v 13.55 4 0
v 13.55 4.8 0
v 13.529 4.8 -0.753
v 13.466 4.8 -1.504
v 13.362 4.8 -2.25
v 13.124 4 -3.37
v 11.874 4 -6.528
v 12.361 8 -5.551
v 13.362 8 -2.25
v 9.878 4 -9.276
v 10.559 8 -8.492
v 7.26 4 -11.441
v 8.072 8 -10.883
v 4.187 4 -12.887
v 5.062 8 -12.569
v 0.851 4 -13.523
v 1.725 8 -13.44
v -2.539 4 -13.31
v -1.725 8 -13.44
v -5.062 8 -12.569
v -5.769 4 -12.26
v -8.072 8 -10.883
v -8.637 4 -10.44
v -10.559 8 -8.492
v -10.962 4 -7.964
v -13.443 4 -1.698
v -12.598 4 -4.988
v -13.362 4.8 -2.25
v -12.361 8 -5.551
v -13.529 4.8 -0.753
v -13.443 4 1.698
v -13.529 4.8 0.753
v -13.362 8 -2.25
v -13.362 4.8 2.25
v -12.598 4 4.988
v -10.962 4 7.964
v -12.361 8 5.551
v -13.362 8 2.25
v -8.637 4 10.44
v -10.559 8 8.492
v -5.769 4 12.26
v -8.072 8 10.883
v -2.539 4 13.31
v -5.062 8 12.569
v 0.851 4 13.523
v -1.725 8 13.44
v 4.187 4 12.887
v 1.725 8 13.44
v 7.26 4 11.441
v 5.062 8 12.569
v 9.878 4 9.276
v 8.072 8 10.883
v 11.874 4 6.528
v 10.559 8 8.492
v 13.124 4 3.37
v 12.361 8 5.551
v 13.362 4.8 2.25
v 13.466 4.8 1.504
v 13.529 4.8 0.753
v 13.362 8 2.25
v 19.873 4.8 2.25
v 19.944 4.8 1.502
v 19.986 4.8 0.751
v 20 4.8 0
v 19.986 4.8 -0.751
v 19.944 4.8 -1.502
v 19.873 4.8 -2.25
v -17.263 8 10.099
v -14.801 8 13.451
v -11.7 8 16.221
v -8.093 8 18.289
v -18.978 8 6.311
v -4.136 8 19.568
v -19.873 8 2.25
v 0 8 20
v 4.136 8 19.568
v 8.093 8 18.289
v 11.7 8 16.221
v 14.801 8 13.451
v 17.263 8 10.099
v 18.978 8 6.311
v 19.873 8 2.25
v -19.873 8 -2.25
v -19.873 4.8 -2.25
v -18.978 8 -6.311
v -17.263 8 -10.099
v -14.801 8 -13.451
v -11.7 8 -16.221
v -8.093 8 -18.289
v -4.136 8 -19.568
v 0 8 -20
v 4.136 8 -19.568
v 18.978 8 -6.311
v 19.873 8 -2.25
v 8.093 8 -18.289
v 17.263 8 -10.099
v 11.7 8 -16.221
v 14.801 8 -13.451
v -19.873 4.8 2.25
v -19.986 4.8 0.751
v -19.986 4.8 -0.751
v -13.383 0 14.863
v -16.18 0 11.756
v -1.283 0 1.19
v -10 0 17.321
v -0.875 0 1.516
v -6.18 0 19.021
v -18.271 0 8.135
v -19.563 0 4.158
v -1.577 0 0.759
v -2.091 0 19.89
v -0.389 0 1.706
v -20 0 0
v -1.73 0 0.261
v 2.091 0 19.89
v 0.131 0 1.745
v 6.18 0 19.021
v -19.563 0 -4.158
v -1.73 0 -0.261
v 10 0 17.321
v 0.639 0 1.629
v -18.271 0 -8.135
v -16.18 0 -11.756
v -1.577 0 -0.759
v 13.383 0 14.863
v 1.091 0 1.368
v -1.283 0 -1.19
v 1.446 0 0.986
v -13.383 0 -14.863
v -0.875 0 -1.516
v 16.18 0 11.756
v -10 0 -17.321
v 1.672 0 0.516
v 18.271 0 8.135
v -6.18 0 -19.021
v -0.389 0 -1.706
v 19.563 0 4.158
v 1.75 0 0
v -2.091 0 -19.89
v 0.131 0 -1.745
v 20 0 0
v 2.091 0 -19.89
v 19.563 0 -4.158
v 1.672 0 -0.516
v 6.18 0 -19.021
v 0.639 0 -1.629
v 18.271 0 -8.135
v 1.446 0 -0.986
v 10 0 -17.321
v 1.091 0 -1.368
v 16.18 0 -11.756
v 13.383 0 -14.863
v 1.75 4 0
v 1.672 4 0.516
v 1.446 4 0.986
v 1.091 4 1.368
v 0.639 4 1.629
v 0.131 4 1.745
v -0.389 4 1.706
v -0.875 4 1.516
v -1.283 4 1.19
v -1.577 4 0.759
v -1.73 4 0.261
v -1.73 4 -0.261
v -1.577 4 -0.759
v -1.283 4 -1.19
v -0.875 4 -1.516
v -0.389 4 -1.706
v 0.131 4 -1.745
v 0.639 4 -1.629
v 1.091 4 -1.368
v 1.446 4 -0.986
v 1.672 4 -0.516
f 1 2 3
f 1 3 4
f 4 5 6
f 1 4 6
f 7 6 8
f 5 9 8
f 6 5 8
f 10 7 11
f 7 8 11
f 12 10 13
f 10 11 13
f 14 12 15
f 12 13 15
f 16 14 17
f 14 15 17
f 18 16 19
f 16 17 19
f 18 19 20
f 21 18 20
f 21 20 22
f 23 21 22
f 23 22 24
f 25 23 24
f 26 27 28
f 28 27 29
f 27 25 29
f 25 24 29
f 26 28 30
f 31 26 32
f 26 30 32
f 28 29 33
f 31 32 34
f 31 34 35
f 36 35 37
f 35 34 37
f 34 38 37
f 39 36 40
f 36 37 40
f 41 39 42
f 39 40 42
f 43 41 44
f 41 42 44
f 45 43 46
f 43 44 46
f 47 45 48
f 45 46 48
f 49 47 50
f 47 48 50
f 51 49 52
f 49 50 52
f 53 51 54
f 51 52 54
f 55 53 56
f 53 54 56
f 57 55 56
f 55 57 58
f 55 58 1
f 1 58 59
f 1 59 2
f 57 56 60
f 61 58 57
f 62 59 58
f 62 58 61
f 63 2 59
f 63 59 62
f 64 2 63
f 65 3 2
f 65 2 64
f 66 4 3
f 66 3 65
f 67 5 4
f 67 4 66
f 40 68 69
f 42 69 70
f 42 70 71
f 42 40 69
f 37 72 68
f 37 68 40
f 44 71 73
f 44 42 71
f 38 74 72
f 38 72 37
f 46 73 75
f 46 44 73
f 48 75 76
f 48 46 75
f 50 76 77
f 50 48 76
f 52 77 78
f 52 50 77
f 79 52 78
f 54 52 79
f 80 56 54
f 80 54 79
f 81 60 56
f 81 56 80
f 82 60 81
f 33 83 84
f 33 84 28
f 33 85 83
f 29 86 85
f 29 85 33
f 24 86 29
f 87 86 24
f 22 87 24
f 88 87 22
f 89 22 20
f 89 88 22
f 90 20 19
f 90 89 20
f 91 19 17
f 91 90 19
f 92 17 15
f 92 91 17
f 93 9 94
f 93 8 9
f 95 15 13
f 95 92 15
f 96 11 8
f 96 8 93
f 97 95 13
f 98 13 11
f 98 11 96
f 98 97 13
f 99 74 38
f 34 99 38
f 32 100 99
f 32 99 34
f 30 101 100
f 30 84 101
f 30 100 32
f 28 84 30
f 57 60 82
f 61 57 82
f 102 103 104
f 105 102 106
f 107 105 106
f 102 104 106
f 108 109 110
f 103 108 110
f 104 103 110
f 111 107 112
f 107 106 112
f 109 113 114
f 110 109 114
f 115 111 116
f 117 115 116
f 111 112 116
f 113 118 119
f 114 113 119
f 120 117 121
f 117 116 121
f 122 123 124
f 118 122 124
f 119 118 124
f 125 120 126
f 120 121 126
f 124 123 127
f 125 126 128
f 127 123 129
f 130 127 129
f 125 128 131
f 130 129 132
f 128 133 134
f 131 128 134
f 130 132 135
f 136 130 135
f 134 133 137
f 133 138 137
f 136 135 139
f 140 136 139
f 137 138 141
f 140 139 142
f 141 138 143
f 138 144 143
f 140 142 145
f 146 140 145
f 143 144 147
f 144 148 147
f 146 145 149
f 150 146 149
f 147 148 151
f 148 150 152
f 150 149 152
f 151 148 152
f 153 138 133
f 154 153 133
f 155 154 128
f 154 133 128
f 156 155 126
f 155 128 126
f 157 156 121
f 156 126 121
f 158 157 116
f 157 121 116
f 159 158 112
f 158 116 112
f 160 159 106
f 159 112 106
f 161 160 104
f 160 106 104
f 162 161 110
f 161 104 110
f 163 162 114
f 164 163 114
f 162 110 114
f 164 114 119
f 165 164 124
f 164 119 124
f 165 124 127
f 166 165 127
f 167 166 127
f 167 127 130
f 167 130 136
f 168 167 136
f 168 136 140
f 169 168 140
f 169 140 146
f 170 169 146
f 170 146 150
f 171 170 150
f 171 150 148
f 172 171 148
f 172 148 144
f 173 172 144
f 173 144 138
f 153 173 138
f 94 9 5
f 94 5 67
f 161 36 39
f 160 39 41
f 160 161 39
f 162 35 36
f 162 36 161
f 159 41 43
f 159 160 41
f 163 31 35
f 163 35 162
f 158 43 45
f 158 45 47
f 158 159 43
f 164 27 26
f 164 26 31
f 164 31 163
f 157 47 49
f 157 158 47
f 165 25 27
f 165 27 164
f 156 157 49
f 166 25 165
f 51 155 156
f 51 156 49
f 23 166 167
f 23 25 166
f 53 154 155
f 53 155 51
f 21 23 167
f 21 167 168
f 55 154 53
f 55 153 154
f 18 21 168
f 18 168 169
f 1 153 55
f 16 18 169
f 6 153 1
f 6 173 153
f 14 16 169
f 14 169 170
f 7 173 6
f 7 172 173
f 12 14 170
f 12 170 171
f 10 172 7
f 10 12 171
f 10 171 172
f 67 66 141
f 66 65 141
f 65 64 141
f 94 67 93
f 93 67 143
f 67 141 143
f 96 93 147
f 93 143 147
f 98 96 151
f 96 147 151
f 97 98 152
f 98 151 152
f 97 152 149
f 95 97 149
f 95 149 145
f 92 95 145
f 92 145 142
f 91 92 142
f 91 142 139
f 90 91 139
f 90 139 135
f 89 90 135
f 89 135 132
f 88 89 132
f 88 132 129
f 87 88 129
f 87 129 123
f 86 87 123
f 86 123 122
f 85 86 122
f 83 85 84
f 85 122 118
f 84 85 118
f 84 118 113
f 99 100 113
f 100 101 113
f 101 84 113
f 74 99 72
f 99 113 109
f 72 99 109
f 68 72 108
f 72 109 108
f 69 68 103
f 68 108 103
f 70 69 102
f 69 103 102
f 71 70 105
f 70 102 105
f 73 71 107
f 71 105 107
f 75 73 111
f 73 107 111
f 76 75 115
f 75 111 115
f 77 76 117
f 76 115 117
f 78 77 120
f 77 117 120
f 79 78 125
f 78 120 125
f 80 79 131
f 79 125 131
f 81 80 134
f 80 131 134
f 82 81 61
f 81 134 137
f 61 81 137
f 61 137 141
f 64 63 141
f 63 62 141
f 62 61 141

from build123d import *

# Parameters (mm, degrees)
SCHIZZO1_R                   = 20
ESTRUSIONE_ESTRUSIONE1_DEPTH = 8
SCHIZZO2_R                   = 13.55
TAGLIO_ESTRUSIONE1_DEPTH     = 4
SCHIZZO3_W                   = 56.131286276
SCHIZZO3_H                   = 4.5
TAGLIO_ESTRUSIONE2_DEPTH     = 3.2
SCHIZZO4_R                   = 1.75
TAGLIO_ESTRUSIONE3_DEPTH     = 9


with BuildPart() as part:
    # Schizzo1 → Estrusione-Estrusione1 (new body)
    with BuildSketch(Plane(origin=(0, 0, 0), x_dir=(1, 0, 0), z_dir=(0, 1, 0))):
        Circle(SCHIZZO1_R)
    extrude(amount=ESTRUSIONE_ESTRUSIONE1_DEPTH)

    # Schizzo2 → Taglio-Estrusione1 (cut)
    with BuildSketch(Plane(origin=(0, 8, 0), x_dir=(1, 0, 0), z_dir=(0, 1, 0))):
        Circle(SCHIZZO2_R)
    extrude(amount=-TAGLIO_ESTRUSIONE1_DEPTH, mode=Mode.SUBTRACT)

    # Schizzo3 → Taglio-Estrusione2 (cut)
    with BuildSketch(Plane(origin=(0, 8, 0), x_dir=(1, 0, 0), z_dir=(0, 1, 0))):
        Rectangle(SCHIZZO3_W, SCHIZZO3_H)
    extrude(amount=-TAGLIO_ESTRUSIONE2_DEPTH, mode=Mode.SUBTRACT)

    # Schizzo4 → Taglio-Estrusione3 (cut, through all)
    with BuildSketch(Plane.XZ):
        Circle(SCHIZZO4_R)
    extrude(amount=-TAGLIO_ESTRUSIONE3_DEPTH, mode=Mode.SUBTRACT)


solid = part.part
